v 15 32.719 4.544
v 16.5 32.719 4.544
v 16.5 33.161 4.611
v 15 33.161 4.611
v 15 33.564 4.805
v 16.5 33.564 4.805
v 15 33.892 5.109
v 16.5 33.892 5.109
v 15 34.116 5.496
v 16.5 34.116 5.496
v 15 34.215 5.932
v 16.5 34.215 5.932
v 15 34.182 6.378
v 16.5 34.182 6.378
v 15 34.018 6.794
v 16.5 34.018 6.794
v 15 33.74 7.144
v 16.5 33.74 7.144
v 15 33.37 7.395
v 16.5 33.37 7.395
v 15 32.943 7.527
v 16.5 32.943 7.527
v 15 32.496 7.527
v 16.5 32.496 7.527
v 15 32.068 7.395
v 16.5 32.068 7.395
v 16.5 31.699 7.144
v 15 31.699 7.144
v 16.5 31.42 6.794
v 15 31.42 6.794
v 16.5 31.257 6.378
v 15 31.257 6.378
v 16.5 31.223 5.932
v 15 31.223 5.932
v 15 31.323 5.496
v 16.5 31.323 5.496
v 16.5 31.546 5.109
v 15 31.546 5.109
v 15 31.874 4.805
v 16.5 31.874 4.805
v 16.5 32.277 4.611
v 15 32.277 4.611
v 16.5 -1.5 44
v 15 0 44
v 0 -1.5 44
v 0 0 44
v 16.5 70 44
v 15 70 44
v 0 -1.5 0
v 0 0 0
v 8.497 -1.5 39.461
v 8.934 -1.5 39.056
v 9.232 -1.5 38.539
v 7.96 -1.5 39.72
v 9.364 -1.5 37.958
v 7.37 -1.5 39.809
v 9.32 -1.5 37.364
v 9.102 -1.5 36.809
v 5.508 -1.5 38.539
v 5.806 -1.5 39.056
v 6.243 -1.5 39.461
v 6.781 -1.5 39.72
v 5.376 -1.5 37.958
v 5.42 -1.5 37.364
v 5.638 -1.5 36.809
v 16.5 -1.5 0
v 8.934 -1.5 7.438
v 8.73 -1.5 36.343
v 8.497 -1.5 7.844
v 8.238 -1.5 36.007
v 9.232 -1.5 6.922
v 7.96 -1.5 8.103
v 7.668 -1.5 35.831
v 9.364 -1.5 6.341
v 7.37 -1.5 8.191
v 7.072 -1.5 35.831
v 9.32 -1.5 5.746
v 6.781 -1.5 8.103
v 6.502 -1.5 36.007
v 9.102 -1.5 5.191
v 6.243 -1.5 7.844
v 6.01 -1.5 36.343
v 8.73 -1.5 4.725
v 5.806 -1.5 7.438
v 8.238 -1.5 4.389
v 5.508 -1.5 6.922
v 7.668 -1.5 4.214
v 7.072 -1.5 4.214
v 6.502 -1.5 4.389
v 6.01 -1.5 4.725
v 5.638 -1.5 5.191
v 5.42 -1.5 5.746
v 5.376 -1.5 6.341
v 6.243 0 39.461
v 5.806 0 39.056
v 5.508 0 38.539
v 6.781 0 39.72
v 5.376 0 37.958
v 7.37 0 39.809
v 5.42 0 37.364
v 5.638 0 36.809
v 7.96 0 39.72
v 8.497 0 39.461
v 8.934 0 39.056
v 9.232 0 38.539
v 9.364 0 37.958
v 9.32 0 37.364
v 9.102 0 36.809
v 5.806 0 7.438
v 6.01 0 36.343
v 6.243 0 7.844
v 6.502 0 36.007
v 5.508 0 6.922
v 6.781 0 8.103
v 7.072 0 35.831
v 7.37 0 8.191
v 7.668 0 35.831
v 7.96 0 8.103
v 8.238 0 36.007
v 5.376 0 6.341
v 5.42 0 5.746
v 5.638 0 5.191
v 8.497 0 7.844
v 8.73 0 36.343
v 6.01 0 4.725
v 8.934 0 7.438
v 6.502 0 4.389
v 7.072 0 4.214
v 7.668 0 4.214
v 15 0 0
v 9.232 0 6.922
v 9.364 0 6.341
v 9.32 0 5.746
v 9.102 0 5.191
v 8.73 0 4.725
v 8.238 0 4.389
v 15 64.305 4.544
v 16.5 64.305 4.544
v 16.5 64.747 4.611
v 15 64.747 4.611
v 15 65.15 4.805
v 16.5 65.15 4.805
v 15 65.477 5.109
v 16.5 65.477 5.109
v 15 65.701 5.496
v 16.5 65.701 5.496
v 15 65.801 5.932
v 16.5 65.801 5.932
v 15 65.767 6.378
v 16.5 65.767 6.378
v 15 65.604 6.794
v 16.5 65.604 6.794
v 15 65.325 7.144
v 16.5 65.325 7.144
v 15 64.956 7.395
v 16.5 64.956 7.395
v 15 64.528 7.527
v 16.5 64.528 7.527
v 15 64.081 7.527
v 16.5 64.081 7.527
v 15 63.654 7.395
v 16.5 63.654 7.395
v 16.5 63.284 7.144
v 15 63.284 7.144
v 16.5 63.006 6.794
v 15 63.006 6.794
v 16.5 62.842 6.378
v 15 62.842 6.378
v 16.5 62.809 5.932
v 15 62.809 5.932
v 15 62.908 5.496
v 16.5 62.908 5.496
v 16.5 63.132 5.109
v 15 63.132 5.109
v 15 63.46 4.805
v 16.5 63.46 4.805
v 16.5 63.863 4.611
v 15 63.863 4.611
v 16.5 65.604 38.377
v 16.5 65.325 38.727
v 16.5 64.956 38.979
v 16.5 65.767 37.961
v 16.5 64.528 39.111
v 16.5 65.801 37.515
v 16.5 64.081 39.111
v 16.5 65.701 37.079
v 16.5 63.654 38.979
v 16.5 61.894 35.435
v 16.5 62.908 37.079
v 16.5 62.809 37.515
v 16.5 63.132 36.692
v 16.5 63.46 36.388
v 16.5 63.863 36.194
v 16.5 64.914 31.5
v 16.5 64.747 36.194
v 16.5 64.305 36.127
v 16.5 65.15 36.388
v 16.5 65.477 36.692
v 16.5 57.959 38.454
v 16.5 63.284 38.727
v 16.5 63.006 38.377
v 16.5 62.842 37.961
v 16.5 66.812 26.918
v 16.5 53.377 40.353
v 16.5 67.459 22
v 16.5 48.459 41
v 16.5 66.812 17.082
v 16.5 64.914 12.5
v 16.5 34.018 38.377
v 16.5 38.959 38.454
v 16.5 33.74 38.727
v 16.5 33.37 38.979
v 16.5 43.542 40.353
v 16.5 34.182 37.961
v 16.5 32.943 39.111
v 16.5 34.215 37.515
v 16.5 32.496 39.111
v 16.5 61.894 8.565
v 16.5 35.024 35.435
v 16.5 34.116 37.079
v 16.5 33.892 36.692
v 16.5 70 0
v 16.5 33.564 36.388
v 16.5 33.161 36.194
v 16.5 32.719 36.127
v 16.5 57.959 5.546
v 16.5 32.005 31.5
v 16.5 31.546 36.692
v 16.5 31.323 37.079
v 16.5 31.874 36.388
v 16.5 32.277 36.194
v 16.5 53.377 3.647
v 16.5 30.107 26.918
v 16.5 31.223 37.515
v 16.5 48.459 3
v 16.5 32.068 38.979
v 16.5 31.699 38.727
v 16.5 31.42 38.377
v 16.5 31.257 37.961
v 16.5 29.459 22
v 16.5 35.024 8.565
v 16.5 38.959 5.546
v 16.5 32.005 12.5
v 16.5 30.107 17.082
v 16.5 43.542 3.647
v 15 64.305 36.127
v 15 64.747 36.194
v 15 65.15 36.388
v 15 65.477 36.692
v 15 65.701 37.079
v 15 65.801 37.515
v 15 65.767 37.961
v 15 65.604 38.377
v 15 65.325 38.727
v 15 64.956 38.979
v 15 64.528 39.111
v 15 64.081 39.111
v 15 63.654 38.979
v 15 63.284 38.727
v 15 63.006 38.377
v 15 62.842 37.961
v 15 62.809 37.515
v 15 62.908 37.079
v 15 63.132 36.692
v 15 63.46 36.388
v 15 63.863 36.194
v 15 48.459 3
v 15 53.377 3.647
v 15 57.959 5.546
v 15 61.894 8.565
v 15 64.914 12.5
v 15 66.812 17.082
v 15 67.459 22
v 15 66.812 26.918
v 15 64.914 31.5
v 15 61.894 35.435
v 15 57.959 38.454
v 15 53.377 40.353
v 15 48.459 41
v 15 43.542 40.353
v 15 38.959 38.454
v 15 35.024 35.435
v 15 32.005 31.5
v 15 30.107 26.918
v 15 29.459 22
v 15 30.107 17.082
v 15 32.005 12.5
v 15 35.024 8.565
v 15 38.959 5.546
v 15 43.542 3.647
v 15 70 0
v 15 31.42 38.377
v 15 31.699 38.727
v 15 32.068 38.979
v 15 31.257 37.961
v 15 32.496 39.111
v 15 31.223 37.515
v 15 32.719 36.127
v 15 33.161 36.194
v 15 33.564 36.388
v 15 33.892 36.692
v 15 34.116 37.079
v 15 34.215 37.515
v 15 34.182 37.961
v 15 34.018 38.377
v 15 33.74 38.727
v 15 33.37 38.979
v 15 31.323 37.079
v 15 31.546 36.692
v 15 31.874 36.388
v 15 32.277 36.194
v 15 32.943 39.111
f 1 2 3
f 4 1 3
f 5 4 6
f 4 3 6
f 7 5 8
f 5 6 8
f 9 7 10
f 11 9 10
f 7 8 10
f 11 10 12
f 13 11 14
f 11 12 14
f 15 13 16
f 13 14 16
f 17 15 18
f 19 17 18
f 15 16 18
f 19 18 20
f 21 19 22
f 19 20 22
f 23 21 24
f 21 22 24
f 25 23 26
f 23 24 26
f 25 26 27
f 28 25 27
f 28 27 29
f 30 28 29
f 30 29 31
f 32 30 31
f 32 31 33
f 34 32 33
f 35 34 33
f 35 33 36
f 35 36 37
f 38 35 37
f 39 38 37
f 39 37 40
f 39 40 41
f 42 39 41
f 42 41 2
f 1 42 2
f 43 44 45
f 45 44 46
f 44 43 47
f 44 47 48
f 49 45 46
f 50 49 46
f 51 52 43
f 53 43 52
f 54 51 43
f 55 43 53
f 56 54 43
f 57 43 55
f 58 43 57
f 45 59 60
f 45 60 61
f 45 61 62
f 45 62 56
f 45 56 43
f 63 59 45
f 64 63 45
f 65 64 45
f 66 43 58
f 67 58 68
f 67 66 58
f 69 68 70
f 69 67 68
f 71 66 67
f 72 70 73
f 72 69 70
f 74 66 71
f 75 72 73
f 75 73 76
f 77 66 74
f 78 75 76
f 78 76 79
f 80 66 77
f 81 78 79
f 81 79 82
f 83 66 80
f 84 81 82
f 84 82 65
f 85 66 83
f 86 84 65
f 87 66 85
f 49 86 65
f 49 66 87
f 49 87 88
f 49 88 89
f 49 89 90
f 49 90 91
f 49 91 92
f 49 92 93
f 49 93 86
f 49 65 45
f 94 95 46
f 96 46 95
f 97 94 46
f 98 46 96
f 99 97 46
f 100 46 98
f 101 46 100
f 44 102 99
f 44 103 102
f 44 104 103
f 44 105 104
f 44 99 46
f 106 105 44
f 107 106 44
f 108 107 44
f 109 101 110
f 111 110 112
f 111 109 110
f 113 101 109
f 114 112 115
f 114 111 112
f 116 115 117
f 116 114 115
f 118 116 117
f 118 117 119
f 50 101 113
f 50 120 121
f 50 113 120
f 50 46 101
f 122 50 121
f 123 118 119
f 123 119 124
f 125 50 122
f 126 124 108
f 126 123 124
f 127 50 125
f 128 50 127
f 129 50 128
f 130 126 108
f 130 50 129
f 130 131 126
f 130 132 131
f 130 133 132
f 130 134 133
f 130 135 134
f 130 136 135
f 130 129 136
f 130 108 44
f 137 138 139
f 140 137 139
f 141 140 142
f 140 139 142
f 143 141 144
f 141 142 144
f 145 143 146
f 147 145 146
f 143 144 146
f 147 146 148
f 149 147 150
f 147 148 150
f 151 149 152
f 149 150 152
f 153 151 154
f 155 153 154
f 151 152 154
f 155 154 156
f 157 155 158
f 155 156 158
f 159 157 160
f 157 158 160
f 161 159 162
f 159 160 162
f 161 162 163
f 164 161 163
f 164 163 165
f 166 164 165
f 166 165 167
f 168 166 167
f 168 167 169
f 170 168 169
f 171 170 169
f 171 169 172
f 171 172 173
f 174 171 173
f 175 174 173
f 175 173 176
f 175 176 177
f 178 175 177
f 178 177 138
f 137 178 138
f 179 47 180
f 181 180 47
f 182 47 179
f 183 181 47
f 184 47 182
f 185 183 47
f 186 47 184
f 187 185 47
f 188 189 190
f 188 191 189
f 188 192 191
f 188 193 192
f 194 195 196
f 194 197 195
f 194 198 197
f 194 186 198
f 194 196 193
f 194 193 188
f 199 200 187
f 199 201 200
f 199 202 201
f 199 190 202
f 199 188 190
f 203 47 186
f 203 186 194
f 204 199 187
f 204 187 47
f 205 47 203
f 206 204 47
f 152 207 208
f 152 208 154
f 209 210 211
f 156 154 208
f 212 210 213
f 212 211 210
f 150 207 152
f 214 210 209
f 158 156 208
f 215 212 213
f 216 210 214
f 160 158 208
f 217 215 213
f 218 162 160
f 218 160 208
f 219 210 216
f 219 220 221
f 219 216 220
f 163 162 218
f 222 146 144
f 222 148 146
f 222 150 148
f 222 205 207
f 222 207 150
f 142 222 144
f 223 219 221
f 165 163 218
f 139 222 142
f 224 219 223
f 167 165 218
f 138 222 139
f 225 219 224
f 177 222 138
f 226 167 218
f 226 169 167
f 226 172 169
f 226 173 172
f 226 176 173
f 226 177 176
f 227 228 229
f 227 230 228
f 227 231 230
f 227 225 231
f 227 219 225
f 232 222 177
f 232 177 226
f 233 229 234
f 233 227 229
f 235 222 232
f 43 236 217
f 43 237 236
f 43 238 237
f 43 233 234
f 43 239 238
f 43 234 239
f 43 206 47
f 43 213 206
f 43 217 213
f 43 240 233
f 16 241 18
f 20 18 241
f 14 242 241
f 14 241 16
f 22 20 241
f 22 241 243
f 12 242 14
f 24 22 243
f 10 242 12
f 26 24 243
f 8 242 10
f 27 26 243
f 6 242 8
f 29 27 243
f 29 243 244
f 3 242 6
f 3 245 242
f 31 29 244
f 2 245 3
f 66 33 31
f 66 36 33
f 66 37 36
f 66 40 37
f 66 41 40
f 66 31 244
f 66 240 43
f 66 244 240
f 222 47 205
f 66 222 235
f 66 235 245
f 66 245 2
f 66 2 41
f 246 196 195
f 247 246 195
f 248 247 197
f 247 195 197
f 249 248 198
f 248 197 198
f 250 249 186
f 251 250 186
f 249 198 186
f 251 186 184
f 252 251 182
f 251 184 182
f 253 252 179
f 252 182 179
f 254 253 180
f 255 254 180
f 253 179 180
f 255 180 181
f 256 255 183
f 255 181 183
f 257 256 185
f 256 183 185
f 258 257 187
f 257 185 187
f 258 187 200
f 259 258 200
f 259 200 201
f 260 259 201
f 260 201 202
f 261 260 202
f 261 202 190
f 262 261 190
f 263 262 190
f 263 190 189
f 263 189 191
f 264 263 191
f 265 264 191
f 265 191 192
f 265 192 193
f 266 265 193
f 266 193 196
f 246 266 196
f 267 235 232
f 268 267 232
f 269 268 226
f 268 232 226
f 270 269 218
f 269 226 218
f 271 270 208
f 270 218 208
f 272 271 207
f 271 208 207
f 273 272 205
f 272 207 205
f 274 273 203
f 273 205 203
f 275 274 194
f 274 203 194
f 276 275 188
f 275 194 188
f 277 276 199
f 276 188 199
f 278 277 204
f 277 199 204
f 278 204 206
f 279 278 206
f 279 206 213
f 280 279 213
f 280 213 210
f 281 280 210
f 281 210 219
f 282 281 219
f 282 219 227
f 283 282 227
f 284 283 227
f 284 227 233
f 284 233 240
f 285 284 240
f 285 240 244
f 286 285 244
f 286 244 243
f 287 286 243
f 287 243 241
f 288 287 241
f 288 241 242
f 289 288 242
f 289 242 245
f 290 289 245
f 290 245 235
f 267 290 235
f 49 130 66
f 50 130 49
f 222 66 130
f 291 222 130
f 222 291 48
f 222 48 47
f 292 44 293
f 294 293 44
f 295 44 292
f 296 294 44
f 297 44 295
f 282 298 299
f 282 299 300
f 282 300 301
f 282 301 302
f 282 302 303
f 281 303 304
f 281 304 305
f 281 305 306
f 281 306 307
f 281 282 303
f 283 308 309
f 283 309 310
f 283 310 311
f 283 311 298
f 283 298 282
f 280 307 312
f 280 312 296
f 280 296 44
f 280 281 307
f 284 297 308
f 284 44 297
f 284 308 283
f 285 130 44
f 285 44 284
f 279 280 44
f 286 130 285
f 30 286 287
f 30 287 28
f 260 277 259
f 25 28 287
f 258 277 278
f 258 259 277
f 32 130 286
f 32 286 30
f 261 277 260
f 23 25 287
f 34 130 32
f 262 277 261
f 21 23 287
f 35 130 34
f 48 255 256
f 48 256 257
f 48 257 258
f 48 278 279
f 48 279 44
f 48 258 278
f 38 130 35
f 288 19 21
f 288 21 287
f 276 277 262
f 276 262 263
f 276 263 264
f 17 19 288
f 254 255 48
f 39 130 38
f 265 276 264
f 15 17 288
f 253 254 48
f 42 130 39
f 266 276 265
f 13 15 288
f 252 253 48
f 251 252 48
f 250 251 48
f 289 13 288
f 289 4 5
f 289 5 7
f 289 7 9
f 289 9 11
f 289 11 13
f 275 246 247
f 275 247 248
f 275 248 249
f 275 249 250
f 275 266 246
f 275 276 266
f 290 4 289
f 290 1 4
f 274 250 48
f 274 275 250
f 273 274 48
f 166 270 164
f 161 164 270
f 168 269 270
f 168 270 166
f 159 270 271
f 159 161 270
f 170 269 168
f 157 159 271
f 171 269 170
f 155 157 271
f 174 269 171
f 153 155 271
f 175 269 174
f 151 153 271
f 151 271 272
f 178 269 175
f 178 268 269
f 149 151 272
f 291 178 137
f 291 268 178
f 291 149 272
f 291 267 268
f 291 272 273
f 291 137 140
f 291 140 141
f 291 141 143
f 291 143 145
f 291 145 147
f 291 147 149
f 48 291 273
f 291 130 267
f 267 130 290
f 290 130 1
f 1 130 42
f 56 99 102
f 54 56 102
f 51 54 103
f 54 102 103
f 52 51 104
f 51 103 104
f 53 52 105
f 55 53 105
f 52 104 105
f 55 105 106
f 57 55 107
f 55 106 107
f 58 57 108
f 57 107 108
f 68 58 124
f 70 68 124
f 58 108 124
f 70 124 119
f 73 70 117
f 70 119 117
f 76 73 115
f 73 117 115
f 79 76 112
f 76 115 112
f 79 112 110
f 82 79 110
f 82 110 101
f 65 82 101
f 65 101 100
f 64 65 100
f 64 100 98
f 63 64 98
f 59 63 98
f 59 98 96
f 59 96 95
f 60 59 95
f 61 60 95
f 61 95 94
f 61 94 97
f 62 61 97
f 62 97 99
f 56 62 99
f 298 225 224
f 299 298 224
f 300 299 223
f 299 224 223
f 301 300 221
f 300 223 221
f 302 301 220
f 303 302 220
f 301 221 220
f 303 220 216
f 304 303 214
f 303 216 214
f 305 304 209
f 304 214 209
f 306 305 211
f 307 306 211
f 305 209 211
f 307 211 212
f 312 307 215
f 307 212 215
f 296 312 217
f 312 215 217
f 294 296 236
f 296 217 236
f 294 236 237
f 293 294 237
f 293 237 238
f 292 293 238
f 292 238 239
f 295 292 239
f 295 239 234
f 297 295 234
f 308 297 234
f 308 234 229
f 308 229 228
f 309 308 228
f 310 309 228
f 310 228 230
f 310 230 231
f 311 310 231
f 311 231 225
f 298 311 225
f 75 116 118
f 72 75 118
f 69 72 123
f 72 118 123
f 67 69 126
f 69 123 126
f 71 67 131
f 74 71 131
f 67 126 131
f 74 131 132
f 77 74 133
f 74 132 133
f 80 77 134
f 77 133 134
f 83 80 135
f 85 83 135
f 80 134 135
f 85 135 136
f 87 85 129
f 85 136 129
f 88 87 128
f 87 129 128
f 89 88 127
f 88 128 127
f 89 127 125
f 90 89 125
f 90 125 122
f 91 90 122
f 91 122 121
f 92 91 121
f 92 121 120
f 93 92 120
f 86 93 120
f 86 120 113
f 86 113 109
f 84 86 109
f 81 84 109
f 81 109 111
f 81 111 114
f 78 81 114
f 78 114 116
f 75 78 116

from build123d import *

# Parameters (mm, degrees)
EXTRUDE_THIN1_DEPTH = 44
SKETCH2_R           = 19
CUT_EXTRUDE1_DEPTH  = 85.310438262
SKETCH3_R           = 2
CUT_EXTRUDE2_DEPTH  = 85.310438262
SKETCH4_R           = 1.5
CUT_EXTRUDE3_DEPTH  = 85.310438262


with BuildPart() as part:
    # Sketch1 → Extrude-Thin1 (new body)
    with BuildSketch(Plane.XY):
        Polygon((0, 0), (15, 0), (15, 70), (16.5, 70), (16.5, -1.5), (0, -1.5), align=None)
    extrude(amount=EXTRUDE_THIN1_DEPTH)

    # Sketch2 → Cut-Extrude1 (cut, through all)
    with BuildSketch(Plane(origin=(16.5, 0, 0), x_dir=(0, 0, -1), z_dir=(1, 0, 0))):
        with Locations((-22, 48.459332075)):
            Circle(SKETCH2_R)
    extrude(amount=-CUT_EXTRUDE1_DEPTH, mode=Mode.SUBTRACT)

    # Sketch3 → Cut-Extrude2 (cut, through all)
    with BuildSketch(Plane(origin=(0, 0, 0), x_dir=(1, 0, 0), z_dir=(0, 1, 0))):
        with Locations(Location((7.370084174, -6.191389664, 0), (0, 0, 270))):
            Circle(SKETCH3_R)
        with Locations(Location((7.370084174, -37.808610336, 0), (0, 0, 270))):
            Circle(SKETCH3_R)
    extrude(amount=-CUT_EXTRUDE2_DEPTH, mode=Mode.SUBTRACT)

    # Sketch4 → Cut-Extrude3 (cut, through all)
    with BuildSketch(Plane(origin=(16.5, 0, 0), x_dir=(0, 0, -1), z_dir=(1, 0, 0))):
        with Locations((-37.627392524, 64.304718843)):
            Circle(SKETCH4_R)
        with Locations((-6.044034896, 64.304718843)):
            Circle(SKETCH4_R)
        with Locations((-37.627392524, 32.719245679)):
            Circle(SKETCH4_R)
        with Locations((-6.044034896, 32.719245679)):
            Circle(SKETCH4_R)
    extrude(amount=-CUT_EXTRUDE3_DEPTH, mode=Mode.SUBTRACT)


solid = part.part
